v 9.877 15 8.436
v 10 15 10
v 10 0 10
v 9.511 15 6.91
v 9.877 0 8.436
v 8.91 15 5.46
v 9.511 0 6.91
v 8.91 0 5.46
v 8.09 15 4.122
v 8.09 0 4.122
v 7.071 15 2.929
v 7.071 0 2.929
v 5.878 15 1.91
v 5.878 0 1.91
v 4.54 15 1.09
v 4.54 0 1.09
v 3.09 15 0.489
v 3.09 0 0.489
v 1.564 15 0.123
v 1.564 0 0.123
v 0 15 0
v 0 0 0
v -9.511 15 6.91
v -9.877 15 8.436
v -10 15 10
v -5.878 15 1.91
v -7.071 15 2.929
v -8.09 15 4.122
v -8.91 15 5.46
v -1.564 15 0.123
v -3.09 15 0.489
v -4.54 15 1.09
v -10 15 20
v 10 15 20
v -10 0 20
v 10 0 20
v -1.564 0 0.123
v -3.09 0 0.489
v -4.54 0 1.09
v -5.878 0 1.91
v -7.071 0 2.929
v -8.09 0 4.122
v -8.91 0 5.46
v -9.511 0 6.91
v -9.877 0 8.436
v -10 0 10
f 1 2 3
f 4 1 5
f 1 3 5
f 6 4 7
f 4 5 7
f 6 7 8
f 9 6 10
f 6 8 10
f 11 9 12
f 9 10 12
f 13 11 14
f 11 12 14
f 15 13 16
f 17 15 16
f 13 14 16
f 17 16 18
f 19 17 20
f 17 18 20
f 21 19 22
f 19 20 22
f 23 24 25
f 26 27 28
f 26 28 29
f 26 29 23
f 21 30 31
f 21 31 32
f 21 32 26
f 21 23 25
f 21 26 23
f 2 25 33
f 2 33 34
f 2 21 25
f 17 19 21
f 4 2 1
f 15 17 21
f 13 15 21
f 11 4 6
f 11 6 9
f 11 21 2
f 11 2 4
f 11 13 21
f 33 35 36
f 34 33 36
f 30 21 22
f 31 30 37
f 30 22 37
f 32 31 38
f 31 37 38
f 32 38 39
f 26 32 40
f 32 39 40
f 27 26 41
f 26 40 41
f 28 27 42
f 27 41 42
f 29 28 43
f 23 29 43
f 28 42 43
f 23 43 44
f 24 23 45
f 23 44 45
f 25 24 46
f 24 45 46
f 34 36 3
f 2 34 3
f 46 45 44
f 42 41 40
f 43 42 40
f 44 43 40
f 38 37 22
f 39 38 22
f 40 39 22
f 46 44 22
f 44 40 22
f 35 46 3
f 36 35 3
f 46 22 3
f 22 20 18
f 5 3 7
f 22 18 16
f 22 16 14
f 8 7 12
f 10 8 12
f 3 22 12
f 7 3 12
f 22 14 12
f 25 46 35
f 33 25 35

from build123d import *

# Parameters (mm, degrees)
BOSS_EXTRUDE1_DEPTH = 15


with BuildPart() as part:
    # Sketch1 → Boss-Extrude1 (new body)
    with BuildSketch(Plane(origin=(0, 0, 0), x_dir=(1, 0, 0), z_dir=(0, 1, 0))):
        with BuildLine():
            ThreePointArc((10, -10), (7.071067812, -2.928932188), (0, 0))
            Line((0, 0), (0, -20))
            Line((0, -20), (10, -20))
            Line((10, -20), (10, -10))
        make_face()
        with BuildLine():
            Line((0, -20), (0, 0))
            ThreePointArc((0, 0), (-7.071067812, -2.928932188), (-10, -10))
            Line((-10, -10), (-10, -20))
            Line((-10, -20), (0, -20))
        make_face()
    extrude(amount=BOSS_EXTRUDE1_DEPTH)


solid = part.part
